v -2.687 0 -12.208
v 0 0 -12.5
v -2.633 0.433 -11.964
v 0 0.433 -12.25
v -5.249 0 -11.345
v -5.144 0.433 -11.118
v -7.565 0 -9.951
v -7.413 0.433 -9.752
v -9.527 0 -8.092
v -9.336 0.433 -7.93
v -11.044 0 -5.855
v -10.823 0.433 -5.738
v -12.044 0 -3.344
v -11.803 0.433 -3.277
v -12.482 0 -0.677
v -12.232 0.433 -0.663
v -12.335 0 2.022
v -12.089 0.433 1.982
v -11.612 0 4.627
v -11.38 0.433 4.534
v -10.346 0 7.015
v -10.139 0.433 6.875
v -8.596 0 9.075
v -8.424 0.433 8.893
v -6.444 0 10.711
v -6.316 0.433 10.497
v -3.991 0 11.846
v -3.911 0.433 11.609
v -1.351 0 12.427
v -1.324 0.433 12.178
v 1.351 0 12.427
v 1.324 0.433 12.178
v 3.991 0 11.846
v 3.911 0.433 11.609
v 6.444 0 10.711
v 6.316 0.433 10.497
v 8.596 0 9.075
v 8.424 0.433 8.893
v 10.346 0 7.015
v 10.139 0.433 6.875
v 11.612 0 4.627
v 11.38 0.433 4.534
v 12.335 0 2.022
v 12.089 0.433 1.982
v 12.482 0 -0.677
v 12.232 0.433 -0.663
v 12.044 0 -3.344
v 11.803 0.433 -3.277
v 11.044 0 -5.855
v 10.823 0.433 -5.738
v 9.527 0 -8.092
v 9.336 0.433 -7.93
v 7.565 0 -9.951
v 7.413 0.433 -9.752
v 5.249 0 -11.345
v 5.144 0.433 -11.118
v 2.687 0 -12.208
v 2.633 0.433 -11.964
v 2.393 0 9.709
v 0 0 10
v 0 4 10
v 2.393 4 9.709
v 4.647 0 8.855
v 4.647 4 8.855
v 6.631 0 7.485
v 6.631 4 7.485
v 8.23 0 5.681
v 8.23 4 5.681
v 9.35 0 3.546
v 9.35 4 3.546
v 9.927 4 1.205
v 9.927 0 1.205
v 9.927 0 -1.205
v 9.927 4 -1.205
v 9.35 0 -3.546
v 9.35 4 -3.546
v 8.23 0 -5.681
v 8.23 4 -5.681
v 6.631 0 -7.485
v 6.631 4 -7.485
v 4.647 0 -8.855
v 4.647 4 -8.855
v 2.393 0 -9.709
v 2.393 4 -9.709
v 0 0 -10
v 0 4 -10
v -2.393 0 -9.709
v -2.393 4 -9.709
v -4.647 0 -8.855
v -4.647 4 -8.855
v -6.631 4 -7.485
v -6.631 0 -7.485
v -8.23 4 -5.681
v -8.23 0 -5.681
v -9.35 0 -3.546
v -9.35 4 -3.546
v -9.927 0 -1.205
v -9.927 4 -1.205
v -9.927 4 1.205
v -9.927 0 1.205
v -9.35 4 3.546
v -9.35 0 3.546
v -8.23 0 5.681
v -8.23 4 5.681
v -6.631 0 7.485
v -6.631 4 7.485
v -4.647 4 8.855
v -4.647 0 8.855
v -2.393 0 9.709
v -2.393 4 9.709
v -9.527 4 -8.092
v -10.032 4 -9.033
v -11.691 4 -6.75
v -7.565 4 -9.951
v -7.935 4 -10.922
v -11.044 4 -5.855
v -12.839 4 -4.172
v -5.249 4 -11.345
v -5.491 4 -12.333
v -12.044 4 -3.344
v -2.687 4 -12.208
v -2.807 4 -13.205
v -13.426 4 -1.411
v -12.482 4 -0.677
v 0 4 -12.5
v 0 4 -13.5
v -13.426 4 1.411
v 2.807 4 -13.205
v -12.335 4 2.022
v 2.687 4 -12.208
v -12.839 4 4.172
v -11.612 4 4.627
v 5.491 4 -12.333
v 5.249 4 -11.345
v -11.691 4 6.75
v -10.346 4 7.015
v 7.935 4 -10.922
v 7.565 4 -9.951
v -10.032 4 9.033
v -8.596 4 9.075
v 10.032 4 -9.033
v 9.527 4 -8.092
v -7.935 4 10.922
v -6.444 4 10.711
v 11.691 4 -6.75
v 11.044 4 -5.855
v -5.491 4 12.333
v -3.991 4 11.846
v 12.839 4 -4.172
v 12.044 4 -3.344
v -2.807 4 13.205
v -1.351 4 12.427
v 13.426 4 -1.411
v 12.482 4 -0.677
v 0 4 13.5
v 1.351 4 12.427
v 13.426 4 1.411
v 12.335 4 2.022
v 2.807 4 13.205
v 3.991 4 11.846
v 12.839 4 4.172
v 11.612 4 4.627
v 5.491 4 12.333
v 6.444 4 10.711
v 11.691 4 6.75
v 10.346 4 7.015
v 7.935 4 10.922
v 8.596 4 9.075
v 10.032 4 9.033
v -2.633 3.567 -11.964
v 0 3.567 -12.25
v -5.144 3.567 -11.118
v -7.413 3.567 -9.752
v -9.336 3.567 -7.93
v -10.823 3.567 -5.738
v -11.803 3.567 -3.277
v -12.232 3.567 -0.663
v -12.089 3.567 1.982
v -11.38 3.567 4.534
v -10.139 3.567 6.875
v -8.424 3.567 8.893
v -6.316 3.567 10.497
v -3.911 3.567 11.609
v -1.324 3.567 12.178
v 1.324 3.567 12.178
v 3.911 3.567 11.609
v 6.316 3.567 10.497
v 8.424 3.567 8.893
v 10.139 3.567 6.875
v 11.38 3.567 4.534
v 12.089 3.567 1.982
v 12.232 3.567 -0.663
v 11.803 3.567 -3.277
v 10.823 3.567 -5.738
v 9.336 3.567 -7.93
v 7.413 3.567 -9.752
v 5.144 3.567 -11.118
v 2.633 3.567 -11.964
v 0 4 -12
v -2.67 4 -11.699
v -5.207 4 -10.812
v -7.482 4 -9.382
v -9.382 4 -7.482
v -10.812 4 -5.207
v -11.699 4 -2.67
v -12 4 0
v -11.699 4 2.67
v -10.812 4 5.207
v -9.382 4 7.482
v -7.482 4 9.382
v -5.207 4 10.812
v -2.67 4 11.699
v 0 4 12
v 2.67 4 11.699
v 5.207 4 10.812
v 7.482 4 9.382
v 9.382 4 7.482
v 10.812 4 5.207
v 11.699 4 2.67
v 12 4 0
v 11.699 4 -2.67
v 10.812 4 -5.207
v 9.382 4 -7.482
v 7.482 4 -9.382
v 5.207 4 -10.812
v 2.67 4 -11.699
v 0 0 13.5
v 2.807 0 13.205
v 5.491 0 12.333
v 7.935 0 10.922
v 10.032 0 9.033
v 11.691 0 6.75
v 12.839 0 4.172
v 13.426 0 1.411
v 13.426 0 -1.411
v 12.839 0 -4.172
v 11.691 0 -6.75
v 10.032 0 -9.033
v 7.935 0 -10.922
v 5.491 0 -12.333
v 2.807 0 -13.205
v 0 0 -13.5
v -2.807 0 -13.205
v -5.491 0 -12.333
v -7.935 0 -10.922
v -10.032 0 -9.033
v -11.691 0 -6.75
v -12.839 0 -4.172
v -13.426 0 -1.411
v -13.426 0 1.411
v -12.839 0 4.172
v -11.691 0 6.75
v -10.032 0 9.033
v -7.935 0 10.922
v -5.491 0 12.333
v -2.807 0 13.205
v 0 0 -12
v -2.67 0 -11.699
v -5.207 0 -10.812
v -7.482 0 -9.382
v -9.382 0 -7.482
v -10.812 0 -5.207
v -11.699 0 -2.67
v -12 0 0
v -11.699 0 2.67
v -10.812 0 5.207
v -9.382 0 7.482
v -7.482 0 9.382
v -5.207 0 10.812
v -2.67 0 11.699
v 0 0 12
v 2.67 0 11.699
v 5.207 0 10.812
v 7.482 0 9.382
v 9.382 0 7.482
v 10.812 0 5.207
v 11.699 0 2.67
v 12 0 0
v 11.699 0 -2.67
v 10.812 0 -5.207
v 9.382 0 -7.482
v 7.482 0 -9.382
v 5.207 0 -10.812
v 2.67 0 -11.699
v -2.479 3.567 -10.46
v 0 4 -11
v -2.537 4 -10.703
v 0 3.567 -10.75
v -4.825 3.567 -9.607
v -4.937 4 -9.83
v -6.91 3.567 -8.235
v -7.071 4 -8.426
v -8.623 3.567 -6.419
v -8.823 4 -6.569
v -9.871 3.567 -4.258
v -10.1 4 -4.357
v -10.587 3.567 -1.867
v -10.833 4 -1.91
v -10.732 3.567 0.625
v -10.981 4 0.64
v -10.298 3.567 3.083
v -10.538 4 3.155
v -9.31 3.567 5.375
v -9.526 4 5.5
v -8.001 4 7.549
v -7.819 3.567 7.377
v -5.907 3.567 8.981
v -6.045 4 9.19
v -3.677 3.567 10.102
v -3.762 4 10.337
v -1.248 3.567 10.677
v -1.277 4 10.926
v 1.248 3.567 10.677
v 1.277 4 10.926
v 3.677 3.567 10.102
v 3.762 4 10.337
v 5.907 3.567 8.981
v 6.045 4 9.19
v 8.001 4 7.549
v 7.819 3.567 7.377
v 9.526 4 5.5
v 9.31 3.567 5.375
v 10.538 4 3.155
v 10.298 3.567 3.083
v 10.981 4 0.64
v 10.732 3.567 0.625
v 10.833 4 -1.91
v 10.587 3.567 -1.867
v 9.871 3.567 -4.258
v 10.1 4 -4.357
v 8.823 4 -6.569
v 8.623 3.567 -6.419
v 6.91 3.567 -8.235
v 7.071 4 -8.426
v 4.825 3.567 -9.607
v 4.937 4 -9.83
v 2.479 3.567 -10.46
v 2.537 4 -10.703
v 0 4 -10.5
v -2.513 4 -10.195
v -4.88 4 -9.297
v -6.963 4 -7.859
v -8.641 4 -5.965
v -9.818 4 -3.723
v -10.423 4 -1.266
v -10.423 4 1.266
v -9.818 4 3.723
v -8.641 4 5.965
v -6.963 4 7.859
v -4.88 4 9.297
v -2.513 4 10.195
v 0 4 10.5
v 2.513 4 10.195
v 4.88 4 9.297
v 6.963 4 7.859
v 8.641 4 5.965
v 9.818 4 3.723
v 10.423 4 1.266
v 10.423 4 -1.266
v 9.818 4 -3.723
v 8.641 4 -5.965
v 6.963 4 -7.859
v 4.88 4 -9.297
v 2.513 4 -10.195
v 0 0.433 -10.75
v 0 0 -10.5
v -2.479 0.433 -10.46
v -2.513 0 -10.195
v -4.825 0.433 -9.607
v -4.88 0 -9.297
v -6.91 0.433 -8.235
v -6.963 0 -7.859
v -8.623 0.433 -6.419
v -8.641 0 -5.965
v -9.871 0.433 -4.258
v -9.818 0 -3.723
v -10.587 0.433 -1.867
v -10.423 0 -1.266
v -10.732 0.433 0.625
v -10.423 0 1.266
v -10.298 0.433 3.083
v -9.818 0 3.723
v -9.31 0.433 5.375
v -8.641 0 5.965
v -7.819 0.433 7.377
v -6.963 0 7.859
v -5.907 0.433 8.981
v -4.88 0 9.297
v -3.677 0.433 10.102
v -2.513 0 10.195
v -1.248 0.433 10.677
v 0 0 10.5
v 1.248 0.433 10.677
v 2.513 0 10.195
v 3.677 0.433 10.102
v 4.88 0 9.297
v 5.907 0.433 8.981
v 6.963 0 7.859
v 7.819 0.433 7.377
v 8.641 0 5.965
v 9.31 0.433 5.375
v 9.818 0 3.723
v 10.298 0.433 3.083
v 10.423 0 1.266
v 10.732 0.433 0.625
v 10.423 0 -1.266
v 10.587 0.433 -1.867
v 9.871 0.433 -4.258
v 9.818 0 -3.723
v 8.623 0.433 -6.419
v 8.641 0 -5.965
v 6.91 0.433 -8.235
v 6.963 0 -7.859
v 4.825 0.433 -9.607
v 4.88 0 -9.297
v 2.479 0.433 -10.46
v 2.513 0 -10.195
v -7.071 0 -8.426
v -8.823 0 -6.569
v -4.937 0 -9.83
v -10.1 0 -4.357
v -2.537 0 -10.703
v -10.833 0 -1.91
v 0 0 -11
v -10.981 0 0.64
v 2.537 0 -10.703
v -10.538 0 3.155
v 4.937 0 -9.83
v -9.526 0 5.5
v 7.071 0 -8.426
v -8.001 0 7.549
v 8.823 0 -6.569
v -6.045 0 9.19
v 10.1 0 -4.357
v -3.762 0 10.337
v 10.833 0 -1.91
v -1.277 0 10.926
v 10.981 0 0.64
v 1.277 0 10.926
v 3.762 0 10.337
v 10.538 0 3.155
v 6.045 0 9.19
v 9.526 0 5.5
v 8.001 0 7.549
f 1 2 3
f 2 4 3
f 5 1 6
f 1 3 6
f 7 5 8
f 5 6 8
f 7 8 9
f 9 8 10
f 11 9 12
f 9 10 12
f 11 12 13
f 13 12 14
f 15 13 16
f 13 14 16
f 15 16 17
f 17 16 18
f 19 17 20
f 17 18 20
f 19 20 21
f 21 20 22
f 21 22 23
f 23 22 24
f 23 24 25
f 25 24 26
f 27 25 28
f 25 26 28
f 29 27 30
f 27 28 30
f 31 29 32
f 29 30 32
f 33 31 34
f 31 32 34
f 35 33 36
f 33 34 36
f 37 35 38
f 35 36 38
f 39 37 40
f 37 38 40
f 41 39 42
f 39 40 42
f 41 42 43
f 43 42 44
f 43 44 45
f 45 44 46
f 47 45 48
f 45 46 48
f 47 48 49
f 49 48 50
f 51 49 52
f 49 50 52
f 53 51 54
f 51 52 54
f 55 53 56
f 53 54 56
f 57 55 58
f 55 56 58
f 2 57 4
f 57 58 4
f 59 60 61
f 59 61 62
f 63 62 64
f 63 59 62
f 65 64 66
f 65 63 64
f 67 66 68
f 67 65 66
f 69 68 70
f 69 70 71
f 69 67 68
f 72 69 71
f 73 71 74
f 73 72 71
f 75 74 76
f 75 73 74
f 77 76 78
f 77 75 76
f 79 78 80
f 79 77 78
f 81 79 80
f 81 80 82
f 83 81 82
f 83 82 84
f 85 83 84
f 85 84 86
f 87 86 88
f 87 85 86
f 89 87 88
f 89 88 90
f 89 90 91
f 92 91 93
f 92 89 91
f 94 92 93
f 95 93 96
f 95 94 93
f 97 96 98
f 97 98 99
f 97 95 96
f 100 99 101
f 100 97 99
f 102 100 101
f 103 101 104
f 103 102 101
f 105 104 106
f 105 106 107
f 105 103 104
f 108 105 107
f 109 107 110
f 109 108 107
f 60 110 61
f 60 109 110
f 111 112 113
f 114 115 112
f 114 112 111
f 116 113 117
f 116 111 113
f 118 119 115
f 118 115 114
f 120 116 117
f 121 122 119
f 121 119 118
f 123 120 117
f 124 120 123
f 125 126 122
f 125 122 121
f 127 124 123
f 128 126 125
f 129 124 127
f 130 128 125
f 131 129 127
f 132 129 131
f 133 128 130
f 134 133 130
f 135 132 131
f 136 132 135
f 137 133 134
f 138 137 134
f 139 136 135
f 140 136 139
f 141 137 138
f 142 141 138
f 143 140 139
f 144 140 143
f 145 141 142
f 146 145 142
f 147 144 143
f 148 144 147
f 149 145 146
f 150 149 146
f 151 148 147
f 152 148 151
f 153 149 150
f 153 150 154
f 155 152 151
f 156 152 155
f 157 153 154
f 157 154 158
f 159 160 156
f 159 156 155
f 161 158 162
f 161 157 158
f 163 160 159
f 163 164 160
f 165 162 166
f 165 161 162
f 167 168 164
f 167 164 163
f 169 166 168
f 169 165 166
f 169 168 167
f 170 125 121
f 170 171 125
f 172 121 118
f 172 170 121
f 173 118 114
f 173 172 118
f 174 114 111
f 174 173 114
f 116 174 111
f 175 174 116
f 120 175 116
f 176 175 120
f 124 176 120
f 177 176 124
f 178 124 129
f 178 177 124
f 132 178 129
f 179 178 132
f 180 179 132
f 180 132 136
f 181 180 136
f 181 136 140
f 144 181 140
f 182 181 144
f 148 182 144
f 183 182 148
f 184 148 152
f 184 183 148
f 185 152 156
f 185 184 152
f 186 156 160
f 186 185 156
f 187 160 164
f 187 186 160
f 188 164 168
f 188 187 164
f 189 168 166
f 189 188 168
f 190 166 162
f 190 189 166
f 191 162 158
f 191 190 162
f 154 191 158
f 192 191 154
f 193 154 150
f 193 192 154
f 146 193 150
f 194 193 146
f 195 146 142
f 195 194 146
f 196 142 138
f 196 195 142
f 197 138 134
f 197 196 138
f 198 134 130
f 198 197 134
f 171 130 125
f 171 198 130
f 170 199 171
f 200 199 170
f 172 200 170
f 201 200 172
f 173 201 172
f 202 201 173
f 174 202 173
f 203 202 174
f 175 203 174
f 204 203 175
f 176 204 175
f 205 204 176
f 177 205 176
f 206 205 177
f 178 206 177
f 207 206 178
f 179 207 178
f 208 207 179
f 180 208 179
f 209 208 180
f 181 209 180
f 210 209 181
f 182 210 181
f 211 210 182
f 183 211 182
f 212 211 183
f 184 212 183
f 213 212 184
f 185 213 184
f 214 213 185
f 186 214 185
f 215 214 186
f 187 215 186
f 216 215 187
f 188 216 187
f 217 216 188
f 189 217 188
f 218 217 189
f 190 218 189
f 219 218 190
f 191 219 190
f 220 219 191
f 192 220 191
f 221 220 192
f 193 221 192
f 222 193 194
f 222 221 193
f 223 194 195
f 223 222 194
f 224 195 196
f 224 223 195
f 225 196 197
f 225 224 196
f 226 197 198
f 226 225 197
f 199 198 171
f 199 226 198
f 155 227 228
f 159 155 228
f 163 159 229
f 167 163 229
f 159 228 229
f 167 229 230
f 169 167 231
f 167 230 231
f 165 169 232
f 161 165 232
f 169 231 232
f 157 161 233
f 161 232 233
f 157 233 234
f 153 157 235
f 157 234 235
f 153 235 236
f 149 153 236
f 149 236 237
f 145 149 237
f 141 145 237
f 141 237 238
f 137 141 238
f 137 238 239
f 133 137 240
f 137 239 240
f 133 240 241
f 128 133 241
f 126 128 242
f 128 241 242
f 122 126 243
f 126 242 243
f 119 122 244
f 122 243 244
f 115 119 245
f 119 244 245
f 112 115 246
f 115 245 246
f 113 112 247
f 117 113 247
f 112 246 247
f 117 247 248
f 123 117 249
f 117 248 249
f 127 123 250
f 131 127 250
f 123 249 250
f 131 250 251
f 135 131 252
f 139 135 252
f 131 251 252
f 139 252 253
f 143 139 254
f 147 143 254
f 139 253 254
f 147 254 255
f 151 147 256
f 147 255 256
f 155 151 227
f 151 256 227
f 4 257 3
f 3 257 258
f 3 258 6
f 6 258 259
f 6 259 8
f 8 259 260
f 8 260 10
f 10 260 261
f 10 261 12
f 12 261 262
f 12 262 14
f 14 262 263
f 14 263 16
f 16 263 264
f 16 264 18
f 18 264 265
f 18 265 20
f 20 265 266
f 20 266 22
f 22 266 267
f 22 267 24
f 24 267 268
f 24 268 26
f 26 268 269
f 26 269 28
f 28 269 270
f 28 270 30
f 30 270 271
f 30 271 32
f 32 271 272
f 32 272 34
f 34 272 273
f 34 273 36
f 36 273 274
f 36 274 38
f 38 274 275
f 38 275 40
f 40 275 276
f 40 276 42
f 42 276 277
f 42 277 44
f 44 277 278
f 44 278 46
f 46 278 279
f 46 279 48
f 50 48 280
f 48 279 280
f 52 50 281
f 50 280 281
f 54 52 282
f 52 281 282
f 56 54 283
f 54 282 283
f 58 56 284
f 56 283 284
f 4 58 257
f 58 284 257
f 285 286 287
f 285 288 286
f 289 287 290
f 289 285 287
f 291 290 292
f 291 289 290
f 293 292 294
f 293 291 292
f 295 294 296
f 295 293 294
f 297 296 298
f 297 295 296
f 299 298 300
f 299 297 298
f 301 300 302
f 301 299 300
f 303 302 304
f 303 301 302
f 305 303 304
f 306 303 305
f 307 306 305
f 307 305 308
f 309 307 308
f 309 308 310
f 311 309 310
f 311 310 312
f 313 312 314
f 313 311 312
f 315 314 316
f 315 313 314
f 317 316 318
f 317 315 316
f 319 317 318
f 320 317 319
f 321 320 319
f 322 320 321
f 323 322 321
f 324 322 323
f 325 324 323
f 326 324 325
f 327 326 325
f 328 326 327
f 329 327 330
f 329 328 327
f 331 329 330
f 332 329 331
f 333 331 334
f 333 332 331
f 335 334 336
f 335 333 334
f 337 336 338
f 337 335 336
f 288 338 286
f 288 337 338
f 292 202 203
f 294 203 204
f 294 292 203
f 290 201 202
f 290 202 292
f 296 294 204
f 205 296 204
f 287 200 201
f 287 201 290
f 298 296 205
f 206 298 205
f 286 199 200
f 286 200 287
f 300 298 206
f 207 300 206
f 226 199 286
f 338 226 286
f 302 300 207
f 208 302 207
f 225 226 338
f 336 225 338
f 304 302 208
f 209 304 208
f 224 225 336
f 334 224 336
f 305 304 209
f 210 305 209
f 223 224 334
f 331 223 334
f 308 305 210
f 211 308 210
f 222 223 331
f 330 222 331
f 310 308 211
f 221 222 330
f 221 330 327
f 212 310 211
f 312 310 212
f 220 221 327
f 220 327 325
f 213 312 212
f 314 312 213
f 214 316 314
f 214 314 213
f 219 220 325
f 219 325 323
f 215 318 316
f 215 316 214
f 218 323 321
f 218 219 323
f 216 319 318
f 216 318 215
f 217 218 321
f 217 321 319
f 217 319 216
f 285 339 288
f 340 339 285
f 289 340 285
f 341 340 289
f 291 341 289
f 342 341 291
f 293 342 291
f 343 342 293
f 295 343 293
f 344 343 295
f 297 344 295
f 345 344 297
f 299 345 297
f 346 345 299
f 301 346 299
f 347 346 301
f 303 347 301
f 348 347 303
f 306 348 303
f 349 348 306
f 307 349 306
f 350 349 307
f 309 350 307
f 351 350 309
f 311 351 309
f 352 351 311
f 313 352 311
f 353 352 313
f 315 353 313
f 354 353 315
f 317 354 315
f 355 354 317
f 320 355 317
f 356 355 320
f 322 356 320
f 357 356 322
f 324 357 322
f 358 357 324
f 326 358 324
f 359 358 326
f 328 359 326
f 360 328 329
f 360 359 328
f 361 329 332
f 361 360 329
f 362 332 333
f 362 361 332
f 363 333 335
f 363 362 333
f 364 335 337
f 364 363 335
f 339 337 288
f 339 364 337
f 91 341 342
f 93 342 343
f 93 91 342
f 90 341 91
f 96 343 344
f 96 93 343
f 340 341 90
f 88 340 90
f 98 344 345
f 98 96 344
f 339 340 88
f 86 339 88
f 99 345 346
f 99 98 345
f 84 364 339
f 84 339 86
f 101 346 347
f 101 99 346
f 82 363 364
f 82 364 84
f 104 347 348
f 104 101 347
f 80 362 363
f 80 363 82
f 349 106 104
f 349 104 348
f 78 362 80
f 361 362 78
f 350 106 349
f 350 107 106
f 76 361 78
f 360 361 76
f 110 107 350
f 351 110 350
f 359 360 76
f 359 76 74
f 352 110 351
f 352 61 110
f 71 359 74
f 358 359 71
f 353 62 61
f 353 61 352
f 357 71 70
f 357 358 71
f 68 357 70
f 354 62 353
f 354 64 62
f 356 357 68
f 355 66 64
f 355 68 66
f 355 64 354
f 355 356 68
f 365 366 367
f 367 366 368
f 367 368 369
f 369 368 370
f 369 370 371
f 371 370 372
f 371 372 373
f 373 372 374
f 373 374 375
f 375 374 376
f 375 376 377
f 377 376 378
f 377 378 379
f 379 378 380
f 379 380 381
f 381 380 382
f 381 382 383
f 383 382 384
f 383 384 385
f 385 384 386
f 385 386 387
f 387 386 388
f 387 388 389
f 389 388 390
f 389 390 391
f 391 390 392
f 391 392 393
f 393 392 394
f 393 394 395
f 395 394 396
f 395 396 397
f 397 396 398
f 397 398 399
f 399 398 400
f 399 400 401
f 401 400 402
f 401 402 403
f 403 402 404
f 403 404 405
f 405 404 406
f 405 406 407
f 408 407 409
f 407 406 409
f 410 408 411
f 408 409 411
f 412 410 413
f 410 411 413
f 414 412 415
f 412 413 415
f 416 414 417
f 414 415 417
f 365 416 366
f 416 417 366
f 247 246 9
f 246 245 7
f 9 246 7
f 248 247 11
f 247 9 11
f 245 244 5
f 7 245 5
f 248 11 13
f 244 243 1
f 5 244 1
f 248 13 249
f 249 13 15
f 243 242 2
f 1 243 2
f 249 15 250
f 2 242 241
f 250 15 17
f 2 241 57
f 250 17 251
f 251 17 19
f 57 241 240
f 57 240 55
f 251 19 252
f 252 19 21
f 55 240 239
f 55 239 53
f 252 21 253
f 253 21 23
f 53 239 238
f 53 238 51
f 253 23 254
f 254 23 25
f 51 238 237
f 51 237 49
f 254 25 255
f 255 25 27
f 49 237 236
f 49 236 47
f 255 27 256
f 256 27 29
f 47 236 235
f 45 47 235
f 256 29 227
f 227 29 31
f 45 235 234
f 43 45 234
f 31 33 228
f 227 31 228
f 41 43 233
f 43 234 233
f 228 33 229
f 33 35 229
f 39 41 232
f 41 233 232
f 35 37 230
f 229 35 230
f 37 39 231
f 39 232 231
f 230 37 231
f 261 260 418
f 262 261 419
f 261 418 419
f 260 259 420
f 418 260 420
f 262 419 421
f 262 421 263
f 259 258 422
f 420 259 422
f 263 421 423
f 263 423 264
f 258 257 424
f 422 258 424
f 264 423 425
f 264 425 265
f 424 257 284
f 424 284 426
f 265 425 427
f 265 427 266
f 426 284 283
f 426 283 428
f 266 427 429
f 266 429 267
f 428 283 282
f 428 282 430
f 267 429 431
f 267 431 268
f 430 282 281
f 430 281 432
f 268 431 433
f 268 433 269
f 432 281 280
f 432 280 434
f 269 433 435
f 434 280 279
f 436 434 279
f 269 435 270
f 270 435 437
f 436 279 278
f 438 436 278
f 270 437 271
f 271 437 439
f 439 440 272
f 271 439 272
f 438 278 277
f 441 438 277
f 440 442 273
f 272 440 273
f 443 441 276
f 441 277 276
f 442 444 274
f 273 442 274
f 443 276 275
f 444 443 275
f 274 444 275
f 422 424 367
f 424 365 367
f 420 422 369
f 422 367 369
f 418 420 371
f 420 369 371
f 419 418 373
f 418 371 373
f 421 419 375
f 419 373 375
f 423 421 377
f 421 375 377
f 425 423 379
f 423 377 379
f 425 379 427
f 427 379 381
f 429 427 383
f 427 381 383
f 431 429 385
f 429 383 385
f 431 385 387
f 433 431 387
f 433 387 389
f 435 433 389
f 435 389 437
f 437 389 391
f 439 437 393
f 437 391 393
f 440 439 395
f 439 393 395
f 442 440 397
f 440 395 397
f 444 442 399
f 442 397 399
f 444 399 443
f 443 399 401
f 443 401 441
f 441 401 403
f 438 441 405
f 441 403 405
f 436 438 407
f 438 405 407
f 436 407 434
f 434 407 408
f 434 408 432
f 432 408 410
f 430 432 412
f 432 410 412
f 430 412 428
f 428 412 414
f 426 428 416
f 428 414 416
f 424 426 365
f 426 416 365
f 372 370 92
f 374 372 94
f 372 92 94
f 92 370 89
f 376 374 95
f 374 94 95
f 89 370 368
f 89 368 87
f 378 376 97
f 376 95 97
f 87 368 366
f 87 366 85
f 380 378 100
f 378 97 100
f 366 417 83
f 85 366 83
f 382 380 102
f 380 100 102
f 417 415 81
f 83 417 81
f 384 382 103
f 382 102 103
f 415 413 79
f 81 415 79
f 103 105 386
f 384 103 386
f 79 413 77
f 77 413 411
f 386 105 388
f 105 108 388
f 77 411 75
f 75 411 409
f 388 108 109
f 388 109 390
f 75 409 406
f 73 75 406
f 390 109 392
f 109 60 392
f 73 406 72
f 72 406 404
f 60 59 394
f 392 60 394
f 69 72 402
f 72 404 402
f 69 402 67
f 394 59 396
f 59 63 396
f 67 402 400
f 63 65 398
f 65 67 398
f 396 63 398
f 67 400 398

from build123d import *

# Parameters (mm, degrees)
SKETCH_1_R      = 13.5
SKETCH_1_R_2    = 10
EXTRUDE_1_DEPTH = 4


with BuildPart() as part:
    # 草图1 → 凸台-拉伸1 (new body)
    with BuildSketch(Plane(origin=(0, 0, 0), x_dir=(1, 0, 0), z_dir=(0, 1, 0))):
        with Locations(Location((0, 0, 0), (0, 0, 270))):
            Circle(SKETCH_1_R)
        with Locations(Location((0, 0, 0), (0, 0, 270))):
            Circle(SKETCH_1_R_2, mode=Mode.SUBTRACT)
    extrude(amount=EXTRUDE_1_DEPTH)

    # 草图3 → 切除-旋转1 (revolve, cut)
    with BuildSketch(Plane.XY, mode=Mode.PRIVATE) as cut_revolve_1_sk:
        Polygon((-12.25, 3.566987298), (-12, 4), (-12.5, 4), align=None)
        Polygon((-10.75, 3.566987298), (-10.5, 4), (-11, 4), align=None)
    cut_revolve_1 = revolve(cut_revolve_1_sk.sketch.rotate(Axis((0, 4, 0), (0, 1, 0)), 270), axis=Axis((0, 4, 0), (0, 1, 0)), mode=Mode.SUBTRACT)

    # 镜向1: 切除-旋转1 across plane
    add(cut_revolve_1.mirror(Plane.ZX.offset(2)), mode=Mode.SUBTRACT)


solid = part.part
